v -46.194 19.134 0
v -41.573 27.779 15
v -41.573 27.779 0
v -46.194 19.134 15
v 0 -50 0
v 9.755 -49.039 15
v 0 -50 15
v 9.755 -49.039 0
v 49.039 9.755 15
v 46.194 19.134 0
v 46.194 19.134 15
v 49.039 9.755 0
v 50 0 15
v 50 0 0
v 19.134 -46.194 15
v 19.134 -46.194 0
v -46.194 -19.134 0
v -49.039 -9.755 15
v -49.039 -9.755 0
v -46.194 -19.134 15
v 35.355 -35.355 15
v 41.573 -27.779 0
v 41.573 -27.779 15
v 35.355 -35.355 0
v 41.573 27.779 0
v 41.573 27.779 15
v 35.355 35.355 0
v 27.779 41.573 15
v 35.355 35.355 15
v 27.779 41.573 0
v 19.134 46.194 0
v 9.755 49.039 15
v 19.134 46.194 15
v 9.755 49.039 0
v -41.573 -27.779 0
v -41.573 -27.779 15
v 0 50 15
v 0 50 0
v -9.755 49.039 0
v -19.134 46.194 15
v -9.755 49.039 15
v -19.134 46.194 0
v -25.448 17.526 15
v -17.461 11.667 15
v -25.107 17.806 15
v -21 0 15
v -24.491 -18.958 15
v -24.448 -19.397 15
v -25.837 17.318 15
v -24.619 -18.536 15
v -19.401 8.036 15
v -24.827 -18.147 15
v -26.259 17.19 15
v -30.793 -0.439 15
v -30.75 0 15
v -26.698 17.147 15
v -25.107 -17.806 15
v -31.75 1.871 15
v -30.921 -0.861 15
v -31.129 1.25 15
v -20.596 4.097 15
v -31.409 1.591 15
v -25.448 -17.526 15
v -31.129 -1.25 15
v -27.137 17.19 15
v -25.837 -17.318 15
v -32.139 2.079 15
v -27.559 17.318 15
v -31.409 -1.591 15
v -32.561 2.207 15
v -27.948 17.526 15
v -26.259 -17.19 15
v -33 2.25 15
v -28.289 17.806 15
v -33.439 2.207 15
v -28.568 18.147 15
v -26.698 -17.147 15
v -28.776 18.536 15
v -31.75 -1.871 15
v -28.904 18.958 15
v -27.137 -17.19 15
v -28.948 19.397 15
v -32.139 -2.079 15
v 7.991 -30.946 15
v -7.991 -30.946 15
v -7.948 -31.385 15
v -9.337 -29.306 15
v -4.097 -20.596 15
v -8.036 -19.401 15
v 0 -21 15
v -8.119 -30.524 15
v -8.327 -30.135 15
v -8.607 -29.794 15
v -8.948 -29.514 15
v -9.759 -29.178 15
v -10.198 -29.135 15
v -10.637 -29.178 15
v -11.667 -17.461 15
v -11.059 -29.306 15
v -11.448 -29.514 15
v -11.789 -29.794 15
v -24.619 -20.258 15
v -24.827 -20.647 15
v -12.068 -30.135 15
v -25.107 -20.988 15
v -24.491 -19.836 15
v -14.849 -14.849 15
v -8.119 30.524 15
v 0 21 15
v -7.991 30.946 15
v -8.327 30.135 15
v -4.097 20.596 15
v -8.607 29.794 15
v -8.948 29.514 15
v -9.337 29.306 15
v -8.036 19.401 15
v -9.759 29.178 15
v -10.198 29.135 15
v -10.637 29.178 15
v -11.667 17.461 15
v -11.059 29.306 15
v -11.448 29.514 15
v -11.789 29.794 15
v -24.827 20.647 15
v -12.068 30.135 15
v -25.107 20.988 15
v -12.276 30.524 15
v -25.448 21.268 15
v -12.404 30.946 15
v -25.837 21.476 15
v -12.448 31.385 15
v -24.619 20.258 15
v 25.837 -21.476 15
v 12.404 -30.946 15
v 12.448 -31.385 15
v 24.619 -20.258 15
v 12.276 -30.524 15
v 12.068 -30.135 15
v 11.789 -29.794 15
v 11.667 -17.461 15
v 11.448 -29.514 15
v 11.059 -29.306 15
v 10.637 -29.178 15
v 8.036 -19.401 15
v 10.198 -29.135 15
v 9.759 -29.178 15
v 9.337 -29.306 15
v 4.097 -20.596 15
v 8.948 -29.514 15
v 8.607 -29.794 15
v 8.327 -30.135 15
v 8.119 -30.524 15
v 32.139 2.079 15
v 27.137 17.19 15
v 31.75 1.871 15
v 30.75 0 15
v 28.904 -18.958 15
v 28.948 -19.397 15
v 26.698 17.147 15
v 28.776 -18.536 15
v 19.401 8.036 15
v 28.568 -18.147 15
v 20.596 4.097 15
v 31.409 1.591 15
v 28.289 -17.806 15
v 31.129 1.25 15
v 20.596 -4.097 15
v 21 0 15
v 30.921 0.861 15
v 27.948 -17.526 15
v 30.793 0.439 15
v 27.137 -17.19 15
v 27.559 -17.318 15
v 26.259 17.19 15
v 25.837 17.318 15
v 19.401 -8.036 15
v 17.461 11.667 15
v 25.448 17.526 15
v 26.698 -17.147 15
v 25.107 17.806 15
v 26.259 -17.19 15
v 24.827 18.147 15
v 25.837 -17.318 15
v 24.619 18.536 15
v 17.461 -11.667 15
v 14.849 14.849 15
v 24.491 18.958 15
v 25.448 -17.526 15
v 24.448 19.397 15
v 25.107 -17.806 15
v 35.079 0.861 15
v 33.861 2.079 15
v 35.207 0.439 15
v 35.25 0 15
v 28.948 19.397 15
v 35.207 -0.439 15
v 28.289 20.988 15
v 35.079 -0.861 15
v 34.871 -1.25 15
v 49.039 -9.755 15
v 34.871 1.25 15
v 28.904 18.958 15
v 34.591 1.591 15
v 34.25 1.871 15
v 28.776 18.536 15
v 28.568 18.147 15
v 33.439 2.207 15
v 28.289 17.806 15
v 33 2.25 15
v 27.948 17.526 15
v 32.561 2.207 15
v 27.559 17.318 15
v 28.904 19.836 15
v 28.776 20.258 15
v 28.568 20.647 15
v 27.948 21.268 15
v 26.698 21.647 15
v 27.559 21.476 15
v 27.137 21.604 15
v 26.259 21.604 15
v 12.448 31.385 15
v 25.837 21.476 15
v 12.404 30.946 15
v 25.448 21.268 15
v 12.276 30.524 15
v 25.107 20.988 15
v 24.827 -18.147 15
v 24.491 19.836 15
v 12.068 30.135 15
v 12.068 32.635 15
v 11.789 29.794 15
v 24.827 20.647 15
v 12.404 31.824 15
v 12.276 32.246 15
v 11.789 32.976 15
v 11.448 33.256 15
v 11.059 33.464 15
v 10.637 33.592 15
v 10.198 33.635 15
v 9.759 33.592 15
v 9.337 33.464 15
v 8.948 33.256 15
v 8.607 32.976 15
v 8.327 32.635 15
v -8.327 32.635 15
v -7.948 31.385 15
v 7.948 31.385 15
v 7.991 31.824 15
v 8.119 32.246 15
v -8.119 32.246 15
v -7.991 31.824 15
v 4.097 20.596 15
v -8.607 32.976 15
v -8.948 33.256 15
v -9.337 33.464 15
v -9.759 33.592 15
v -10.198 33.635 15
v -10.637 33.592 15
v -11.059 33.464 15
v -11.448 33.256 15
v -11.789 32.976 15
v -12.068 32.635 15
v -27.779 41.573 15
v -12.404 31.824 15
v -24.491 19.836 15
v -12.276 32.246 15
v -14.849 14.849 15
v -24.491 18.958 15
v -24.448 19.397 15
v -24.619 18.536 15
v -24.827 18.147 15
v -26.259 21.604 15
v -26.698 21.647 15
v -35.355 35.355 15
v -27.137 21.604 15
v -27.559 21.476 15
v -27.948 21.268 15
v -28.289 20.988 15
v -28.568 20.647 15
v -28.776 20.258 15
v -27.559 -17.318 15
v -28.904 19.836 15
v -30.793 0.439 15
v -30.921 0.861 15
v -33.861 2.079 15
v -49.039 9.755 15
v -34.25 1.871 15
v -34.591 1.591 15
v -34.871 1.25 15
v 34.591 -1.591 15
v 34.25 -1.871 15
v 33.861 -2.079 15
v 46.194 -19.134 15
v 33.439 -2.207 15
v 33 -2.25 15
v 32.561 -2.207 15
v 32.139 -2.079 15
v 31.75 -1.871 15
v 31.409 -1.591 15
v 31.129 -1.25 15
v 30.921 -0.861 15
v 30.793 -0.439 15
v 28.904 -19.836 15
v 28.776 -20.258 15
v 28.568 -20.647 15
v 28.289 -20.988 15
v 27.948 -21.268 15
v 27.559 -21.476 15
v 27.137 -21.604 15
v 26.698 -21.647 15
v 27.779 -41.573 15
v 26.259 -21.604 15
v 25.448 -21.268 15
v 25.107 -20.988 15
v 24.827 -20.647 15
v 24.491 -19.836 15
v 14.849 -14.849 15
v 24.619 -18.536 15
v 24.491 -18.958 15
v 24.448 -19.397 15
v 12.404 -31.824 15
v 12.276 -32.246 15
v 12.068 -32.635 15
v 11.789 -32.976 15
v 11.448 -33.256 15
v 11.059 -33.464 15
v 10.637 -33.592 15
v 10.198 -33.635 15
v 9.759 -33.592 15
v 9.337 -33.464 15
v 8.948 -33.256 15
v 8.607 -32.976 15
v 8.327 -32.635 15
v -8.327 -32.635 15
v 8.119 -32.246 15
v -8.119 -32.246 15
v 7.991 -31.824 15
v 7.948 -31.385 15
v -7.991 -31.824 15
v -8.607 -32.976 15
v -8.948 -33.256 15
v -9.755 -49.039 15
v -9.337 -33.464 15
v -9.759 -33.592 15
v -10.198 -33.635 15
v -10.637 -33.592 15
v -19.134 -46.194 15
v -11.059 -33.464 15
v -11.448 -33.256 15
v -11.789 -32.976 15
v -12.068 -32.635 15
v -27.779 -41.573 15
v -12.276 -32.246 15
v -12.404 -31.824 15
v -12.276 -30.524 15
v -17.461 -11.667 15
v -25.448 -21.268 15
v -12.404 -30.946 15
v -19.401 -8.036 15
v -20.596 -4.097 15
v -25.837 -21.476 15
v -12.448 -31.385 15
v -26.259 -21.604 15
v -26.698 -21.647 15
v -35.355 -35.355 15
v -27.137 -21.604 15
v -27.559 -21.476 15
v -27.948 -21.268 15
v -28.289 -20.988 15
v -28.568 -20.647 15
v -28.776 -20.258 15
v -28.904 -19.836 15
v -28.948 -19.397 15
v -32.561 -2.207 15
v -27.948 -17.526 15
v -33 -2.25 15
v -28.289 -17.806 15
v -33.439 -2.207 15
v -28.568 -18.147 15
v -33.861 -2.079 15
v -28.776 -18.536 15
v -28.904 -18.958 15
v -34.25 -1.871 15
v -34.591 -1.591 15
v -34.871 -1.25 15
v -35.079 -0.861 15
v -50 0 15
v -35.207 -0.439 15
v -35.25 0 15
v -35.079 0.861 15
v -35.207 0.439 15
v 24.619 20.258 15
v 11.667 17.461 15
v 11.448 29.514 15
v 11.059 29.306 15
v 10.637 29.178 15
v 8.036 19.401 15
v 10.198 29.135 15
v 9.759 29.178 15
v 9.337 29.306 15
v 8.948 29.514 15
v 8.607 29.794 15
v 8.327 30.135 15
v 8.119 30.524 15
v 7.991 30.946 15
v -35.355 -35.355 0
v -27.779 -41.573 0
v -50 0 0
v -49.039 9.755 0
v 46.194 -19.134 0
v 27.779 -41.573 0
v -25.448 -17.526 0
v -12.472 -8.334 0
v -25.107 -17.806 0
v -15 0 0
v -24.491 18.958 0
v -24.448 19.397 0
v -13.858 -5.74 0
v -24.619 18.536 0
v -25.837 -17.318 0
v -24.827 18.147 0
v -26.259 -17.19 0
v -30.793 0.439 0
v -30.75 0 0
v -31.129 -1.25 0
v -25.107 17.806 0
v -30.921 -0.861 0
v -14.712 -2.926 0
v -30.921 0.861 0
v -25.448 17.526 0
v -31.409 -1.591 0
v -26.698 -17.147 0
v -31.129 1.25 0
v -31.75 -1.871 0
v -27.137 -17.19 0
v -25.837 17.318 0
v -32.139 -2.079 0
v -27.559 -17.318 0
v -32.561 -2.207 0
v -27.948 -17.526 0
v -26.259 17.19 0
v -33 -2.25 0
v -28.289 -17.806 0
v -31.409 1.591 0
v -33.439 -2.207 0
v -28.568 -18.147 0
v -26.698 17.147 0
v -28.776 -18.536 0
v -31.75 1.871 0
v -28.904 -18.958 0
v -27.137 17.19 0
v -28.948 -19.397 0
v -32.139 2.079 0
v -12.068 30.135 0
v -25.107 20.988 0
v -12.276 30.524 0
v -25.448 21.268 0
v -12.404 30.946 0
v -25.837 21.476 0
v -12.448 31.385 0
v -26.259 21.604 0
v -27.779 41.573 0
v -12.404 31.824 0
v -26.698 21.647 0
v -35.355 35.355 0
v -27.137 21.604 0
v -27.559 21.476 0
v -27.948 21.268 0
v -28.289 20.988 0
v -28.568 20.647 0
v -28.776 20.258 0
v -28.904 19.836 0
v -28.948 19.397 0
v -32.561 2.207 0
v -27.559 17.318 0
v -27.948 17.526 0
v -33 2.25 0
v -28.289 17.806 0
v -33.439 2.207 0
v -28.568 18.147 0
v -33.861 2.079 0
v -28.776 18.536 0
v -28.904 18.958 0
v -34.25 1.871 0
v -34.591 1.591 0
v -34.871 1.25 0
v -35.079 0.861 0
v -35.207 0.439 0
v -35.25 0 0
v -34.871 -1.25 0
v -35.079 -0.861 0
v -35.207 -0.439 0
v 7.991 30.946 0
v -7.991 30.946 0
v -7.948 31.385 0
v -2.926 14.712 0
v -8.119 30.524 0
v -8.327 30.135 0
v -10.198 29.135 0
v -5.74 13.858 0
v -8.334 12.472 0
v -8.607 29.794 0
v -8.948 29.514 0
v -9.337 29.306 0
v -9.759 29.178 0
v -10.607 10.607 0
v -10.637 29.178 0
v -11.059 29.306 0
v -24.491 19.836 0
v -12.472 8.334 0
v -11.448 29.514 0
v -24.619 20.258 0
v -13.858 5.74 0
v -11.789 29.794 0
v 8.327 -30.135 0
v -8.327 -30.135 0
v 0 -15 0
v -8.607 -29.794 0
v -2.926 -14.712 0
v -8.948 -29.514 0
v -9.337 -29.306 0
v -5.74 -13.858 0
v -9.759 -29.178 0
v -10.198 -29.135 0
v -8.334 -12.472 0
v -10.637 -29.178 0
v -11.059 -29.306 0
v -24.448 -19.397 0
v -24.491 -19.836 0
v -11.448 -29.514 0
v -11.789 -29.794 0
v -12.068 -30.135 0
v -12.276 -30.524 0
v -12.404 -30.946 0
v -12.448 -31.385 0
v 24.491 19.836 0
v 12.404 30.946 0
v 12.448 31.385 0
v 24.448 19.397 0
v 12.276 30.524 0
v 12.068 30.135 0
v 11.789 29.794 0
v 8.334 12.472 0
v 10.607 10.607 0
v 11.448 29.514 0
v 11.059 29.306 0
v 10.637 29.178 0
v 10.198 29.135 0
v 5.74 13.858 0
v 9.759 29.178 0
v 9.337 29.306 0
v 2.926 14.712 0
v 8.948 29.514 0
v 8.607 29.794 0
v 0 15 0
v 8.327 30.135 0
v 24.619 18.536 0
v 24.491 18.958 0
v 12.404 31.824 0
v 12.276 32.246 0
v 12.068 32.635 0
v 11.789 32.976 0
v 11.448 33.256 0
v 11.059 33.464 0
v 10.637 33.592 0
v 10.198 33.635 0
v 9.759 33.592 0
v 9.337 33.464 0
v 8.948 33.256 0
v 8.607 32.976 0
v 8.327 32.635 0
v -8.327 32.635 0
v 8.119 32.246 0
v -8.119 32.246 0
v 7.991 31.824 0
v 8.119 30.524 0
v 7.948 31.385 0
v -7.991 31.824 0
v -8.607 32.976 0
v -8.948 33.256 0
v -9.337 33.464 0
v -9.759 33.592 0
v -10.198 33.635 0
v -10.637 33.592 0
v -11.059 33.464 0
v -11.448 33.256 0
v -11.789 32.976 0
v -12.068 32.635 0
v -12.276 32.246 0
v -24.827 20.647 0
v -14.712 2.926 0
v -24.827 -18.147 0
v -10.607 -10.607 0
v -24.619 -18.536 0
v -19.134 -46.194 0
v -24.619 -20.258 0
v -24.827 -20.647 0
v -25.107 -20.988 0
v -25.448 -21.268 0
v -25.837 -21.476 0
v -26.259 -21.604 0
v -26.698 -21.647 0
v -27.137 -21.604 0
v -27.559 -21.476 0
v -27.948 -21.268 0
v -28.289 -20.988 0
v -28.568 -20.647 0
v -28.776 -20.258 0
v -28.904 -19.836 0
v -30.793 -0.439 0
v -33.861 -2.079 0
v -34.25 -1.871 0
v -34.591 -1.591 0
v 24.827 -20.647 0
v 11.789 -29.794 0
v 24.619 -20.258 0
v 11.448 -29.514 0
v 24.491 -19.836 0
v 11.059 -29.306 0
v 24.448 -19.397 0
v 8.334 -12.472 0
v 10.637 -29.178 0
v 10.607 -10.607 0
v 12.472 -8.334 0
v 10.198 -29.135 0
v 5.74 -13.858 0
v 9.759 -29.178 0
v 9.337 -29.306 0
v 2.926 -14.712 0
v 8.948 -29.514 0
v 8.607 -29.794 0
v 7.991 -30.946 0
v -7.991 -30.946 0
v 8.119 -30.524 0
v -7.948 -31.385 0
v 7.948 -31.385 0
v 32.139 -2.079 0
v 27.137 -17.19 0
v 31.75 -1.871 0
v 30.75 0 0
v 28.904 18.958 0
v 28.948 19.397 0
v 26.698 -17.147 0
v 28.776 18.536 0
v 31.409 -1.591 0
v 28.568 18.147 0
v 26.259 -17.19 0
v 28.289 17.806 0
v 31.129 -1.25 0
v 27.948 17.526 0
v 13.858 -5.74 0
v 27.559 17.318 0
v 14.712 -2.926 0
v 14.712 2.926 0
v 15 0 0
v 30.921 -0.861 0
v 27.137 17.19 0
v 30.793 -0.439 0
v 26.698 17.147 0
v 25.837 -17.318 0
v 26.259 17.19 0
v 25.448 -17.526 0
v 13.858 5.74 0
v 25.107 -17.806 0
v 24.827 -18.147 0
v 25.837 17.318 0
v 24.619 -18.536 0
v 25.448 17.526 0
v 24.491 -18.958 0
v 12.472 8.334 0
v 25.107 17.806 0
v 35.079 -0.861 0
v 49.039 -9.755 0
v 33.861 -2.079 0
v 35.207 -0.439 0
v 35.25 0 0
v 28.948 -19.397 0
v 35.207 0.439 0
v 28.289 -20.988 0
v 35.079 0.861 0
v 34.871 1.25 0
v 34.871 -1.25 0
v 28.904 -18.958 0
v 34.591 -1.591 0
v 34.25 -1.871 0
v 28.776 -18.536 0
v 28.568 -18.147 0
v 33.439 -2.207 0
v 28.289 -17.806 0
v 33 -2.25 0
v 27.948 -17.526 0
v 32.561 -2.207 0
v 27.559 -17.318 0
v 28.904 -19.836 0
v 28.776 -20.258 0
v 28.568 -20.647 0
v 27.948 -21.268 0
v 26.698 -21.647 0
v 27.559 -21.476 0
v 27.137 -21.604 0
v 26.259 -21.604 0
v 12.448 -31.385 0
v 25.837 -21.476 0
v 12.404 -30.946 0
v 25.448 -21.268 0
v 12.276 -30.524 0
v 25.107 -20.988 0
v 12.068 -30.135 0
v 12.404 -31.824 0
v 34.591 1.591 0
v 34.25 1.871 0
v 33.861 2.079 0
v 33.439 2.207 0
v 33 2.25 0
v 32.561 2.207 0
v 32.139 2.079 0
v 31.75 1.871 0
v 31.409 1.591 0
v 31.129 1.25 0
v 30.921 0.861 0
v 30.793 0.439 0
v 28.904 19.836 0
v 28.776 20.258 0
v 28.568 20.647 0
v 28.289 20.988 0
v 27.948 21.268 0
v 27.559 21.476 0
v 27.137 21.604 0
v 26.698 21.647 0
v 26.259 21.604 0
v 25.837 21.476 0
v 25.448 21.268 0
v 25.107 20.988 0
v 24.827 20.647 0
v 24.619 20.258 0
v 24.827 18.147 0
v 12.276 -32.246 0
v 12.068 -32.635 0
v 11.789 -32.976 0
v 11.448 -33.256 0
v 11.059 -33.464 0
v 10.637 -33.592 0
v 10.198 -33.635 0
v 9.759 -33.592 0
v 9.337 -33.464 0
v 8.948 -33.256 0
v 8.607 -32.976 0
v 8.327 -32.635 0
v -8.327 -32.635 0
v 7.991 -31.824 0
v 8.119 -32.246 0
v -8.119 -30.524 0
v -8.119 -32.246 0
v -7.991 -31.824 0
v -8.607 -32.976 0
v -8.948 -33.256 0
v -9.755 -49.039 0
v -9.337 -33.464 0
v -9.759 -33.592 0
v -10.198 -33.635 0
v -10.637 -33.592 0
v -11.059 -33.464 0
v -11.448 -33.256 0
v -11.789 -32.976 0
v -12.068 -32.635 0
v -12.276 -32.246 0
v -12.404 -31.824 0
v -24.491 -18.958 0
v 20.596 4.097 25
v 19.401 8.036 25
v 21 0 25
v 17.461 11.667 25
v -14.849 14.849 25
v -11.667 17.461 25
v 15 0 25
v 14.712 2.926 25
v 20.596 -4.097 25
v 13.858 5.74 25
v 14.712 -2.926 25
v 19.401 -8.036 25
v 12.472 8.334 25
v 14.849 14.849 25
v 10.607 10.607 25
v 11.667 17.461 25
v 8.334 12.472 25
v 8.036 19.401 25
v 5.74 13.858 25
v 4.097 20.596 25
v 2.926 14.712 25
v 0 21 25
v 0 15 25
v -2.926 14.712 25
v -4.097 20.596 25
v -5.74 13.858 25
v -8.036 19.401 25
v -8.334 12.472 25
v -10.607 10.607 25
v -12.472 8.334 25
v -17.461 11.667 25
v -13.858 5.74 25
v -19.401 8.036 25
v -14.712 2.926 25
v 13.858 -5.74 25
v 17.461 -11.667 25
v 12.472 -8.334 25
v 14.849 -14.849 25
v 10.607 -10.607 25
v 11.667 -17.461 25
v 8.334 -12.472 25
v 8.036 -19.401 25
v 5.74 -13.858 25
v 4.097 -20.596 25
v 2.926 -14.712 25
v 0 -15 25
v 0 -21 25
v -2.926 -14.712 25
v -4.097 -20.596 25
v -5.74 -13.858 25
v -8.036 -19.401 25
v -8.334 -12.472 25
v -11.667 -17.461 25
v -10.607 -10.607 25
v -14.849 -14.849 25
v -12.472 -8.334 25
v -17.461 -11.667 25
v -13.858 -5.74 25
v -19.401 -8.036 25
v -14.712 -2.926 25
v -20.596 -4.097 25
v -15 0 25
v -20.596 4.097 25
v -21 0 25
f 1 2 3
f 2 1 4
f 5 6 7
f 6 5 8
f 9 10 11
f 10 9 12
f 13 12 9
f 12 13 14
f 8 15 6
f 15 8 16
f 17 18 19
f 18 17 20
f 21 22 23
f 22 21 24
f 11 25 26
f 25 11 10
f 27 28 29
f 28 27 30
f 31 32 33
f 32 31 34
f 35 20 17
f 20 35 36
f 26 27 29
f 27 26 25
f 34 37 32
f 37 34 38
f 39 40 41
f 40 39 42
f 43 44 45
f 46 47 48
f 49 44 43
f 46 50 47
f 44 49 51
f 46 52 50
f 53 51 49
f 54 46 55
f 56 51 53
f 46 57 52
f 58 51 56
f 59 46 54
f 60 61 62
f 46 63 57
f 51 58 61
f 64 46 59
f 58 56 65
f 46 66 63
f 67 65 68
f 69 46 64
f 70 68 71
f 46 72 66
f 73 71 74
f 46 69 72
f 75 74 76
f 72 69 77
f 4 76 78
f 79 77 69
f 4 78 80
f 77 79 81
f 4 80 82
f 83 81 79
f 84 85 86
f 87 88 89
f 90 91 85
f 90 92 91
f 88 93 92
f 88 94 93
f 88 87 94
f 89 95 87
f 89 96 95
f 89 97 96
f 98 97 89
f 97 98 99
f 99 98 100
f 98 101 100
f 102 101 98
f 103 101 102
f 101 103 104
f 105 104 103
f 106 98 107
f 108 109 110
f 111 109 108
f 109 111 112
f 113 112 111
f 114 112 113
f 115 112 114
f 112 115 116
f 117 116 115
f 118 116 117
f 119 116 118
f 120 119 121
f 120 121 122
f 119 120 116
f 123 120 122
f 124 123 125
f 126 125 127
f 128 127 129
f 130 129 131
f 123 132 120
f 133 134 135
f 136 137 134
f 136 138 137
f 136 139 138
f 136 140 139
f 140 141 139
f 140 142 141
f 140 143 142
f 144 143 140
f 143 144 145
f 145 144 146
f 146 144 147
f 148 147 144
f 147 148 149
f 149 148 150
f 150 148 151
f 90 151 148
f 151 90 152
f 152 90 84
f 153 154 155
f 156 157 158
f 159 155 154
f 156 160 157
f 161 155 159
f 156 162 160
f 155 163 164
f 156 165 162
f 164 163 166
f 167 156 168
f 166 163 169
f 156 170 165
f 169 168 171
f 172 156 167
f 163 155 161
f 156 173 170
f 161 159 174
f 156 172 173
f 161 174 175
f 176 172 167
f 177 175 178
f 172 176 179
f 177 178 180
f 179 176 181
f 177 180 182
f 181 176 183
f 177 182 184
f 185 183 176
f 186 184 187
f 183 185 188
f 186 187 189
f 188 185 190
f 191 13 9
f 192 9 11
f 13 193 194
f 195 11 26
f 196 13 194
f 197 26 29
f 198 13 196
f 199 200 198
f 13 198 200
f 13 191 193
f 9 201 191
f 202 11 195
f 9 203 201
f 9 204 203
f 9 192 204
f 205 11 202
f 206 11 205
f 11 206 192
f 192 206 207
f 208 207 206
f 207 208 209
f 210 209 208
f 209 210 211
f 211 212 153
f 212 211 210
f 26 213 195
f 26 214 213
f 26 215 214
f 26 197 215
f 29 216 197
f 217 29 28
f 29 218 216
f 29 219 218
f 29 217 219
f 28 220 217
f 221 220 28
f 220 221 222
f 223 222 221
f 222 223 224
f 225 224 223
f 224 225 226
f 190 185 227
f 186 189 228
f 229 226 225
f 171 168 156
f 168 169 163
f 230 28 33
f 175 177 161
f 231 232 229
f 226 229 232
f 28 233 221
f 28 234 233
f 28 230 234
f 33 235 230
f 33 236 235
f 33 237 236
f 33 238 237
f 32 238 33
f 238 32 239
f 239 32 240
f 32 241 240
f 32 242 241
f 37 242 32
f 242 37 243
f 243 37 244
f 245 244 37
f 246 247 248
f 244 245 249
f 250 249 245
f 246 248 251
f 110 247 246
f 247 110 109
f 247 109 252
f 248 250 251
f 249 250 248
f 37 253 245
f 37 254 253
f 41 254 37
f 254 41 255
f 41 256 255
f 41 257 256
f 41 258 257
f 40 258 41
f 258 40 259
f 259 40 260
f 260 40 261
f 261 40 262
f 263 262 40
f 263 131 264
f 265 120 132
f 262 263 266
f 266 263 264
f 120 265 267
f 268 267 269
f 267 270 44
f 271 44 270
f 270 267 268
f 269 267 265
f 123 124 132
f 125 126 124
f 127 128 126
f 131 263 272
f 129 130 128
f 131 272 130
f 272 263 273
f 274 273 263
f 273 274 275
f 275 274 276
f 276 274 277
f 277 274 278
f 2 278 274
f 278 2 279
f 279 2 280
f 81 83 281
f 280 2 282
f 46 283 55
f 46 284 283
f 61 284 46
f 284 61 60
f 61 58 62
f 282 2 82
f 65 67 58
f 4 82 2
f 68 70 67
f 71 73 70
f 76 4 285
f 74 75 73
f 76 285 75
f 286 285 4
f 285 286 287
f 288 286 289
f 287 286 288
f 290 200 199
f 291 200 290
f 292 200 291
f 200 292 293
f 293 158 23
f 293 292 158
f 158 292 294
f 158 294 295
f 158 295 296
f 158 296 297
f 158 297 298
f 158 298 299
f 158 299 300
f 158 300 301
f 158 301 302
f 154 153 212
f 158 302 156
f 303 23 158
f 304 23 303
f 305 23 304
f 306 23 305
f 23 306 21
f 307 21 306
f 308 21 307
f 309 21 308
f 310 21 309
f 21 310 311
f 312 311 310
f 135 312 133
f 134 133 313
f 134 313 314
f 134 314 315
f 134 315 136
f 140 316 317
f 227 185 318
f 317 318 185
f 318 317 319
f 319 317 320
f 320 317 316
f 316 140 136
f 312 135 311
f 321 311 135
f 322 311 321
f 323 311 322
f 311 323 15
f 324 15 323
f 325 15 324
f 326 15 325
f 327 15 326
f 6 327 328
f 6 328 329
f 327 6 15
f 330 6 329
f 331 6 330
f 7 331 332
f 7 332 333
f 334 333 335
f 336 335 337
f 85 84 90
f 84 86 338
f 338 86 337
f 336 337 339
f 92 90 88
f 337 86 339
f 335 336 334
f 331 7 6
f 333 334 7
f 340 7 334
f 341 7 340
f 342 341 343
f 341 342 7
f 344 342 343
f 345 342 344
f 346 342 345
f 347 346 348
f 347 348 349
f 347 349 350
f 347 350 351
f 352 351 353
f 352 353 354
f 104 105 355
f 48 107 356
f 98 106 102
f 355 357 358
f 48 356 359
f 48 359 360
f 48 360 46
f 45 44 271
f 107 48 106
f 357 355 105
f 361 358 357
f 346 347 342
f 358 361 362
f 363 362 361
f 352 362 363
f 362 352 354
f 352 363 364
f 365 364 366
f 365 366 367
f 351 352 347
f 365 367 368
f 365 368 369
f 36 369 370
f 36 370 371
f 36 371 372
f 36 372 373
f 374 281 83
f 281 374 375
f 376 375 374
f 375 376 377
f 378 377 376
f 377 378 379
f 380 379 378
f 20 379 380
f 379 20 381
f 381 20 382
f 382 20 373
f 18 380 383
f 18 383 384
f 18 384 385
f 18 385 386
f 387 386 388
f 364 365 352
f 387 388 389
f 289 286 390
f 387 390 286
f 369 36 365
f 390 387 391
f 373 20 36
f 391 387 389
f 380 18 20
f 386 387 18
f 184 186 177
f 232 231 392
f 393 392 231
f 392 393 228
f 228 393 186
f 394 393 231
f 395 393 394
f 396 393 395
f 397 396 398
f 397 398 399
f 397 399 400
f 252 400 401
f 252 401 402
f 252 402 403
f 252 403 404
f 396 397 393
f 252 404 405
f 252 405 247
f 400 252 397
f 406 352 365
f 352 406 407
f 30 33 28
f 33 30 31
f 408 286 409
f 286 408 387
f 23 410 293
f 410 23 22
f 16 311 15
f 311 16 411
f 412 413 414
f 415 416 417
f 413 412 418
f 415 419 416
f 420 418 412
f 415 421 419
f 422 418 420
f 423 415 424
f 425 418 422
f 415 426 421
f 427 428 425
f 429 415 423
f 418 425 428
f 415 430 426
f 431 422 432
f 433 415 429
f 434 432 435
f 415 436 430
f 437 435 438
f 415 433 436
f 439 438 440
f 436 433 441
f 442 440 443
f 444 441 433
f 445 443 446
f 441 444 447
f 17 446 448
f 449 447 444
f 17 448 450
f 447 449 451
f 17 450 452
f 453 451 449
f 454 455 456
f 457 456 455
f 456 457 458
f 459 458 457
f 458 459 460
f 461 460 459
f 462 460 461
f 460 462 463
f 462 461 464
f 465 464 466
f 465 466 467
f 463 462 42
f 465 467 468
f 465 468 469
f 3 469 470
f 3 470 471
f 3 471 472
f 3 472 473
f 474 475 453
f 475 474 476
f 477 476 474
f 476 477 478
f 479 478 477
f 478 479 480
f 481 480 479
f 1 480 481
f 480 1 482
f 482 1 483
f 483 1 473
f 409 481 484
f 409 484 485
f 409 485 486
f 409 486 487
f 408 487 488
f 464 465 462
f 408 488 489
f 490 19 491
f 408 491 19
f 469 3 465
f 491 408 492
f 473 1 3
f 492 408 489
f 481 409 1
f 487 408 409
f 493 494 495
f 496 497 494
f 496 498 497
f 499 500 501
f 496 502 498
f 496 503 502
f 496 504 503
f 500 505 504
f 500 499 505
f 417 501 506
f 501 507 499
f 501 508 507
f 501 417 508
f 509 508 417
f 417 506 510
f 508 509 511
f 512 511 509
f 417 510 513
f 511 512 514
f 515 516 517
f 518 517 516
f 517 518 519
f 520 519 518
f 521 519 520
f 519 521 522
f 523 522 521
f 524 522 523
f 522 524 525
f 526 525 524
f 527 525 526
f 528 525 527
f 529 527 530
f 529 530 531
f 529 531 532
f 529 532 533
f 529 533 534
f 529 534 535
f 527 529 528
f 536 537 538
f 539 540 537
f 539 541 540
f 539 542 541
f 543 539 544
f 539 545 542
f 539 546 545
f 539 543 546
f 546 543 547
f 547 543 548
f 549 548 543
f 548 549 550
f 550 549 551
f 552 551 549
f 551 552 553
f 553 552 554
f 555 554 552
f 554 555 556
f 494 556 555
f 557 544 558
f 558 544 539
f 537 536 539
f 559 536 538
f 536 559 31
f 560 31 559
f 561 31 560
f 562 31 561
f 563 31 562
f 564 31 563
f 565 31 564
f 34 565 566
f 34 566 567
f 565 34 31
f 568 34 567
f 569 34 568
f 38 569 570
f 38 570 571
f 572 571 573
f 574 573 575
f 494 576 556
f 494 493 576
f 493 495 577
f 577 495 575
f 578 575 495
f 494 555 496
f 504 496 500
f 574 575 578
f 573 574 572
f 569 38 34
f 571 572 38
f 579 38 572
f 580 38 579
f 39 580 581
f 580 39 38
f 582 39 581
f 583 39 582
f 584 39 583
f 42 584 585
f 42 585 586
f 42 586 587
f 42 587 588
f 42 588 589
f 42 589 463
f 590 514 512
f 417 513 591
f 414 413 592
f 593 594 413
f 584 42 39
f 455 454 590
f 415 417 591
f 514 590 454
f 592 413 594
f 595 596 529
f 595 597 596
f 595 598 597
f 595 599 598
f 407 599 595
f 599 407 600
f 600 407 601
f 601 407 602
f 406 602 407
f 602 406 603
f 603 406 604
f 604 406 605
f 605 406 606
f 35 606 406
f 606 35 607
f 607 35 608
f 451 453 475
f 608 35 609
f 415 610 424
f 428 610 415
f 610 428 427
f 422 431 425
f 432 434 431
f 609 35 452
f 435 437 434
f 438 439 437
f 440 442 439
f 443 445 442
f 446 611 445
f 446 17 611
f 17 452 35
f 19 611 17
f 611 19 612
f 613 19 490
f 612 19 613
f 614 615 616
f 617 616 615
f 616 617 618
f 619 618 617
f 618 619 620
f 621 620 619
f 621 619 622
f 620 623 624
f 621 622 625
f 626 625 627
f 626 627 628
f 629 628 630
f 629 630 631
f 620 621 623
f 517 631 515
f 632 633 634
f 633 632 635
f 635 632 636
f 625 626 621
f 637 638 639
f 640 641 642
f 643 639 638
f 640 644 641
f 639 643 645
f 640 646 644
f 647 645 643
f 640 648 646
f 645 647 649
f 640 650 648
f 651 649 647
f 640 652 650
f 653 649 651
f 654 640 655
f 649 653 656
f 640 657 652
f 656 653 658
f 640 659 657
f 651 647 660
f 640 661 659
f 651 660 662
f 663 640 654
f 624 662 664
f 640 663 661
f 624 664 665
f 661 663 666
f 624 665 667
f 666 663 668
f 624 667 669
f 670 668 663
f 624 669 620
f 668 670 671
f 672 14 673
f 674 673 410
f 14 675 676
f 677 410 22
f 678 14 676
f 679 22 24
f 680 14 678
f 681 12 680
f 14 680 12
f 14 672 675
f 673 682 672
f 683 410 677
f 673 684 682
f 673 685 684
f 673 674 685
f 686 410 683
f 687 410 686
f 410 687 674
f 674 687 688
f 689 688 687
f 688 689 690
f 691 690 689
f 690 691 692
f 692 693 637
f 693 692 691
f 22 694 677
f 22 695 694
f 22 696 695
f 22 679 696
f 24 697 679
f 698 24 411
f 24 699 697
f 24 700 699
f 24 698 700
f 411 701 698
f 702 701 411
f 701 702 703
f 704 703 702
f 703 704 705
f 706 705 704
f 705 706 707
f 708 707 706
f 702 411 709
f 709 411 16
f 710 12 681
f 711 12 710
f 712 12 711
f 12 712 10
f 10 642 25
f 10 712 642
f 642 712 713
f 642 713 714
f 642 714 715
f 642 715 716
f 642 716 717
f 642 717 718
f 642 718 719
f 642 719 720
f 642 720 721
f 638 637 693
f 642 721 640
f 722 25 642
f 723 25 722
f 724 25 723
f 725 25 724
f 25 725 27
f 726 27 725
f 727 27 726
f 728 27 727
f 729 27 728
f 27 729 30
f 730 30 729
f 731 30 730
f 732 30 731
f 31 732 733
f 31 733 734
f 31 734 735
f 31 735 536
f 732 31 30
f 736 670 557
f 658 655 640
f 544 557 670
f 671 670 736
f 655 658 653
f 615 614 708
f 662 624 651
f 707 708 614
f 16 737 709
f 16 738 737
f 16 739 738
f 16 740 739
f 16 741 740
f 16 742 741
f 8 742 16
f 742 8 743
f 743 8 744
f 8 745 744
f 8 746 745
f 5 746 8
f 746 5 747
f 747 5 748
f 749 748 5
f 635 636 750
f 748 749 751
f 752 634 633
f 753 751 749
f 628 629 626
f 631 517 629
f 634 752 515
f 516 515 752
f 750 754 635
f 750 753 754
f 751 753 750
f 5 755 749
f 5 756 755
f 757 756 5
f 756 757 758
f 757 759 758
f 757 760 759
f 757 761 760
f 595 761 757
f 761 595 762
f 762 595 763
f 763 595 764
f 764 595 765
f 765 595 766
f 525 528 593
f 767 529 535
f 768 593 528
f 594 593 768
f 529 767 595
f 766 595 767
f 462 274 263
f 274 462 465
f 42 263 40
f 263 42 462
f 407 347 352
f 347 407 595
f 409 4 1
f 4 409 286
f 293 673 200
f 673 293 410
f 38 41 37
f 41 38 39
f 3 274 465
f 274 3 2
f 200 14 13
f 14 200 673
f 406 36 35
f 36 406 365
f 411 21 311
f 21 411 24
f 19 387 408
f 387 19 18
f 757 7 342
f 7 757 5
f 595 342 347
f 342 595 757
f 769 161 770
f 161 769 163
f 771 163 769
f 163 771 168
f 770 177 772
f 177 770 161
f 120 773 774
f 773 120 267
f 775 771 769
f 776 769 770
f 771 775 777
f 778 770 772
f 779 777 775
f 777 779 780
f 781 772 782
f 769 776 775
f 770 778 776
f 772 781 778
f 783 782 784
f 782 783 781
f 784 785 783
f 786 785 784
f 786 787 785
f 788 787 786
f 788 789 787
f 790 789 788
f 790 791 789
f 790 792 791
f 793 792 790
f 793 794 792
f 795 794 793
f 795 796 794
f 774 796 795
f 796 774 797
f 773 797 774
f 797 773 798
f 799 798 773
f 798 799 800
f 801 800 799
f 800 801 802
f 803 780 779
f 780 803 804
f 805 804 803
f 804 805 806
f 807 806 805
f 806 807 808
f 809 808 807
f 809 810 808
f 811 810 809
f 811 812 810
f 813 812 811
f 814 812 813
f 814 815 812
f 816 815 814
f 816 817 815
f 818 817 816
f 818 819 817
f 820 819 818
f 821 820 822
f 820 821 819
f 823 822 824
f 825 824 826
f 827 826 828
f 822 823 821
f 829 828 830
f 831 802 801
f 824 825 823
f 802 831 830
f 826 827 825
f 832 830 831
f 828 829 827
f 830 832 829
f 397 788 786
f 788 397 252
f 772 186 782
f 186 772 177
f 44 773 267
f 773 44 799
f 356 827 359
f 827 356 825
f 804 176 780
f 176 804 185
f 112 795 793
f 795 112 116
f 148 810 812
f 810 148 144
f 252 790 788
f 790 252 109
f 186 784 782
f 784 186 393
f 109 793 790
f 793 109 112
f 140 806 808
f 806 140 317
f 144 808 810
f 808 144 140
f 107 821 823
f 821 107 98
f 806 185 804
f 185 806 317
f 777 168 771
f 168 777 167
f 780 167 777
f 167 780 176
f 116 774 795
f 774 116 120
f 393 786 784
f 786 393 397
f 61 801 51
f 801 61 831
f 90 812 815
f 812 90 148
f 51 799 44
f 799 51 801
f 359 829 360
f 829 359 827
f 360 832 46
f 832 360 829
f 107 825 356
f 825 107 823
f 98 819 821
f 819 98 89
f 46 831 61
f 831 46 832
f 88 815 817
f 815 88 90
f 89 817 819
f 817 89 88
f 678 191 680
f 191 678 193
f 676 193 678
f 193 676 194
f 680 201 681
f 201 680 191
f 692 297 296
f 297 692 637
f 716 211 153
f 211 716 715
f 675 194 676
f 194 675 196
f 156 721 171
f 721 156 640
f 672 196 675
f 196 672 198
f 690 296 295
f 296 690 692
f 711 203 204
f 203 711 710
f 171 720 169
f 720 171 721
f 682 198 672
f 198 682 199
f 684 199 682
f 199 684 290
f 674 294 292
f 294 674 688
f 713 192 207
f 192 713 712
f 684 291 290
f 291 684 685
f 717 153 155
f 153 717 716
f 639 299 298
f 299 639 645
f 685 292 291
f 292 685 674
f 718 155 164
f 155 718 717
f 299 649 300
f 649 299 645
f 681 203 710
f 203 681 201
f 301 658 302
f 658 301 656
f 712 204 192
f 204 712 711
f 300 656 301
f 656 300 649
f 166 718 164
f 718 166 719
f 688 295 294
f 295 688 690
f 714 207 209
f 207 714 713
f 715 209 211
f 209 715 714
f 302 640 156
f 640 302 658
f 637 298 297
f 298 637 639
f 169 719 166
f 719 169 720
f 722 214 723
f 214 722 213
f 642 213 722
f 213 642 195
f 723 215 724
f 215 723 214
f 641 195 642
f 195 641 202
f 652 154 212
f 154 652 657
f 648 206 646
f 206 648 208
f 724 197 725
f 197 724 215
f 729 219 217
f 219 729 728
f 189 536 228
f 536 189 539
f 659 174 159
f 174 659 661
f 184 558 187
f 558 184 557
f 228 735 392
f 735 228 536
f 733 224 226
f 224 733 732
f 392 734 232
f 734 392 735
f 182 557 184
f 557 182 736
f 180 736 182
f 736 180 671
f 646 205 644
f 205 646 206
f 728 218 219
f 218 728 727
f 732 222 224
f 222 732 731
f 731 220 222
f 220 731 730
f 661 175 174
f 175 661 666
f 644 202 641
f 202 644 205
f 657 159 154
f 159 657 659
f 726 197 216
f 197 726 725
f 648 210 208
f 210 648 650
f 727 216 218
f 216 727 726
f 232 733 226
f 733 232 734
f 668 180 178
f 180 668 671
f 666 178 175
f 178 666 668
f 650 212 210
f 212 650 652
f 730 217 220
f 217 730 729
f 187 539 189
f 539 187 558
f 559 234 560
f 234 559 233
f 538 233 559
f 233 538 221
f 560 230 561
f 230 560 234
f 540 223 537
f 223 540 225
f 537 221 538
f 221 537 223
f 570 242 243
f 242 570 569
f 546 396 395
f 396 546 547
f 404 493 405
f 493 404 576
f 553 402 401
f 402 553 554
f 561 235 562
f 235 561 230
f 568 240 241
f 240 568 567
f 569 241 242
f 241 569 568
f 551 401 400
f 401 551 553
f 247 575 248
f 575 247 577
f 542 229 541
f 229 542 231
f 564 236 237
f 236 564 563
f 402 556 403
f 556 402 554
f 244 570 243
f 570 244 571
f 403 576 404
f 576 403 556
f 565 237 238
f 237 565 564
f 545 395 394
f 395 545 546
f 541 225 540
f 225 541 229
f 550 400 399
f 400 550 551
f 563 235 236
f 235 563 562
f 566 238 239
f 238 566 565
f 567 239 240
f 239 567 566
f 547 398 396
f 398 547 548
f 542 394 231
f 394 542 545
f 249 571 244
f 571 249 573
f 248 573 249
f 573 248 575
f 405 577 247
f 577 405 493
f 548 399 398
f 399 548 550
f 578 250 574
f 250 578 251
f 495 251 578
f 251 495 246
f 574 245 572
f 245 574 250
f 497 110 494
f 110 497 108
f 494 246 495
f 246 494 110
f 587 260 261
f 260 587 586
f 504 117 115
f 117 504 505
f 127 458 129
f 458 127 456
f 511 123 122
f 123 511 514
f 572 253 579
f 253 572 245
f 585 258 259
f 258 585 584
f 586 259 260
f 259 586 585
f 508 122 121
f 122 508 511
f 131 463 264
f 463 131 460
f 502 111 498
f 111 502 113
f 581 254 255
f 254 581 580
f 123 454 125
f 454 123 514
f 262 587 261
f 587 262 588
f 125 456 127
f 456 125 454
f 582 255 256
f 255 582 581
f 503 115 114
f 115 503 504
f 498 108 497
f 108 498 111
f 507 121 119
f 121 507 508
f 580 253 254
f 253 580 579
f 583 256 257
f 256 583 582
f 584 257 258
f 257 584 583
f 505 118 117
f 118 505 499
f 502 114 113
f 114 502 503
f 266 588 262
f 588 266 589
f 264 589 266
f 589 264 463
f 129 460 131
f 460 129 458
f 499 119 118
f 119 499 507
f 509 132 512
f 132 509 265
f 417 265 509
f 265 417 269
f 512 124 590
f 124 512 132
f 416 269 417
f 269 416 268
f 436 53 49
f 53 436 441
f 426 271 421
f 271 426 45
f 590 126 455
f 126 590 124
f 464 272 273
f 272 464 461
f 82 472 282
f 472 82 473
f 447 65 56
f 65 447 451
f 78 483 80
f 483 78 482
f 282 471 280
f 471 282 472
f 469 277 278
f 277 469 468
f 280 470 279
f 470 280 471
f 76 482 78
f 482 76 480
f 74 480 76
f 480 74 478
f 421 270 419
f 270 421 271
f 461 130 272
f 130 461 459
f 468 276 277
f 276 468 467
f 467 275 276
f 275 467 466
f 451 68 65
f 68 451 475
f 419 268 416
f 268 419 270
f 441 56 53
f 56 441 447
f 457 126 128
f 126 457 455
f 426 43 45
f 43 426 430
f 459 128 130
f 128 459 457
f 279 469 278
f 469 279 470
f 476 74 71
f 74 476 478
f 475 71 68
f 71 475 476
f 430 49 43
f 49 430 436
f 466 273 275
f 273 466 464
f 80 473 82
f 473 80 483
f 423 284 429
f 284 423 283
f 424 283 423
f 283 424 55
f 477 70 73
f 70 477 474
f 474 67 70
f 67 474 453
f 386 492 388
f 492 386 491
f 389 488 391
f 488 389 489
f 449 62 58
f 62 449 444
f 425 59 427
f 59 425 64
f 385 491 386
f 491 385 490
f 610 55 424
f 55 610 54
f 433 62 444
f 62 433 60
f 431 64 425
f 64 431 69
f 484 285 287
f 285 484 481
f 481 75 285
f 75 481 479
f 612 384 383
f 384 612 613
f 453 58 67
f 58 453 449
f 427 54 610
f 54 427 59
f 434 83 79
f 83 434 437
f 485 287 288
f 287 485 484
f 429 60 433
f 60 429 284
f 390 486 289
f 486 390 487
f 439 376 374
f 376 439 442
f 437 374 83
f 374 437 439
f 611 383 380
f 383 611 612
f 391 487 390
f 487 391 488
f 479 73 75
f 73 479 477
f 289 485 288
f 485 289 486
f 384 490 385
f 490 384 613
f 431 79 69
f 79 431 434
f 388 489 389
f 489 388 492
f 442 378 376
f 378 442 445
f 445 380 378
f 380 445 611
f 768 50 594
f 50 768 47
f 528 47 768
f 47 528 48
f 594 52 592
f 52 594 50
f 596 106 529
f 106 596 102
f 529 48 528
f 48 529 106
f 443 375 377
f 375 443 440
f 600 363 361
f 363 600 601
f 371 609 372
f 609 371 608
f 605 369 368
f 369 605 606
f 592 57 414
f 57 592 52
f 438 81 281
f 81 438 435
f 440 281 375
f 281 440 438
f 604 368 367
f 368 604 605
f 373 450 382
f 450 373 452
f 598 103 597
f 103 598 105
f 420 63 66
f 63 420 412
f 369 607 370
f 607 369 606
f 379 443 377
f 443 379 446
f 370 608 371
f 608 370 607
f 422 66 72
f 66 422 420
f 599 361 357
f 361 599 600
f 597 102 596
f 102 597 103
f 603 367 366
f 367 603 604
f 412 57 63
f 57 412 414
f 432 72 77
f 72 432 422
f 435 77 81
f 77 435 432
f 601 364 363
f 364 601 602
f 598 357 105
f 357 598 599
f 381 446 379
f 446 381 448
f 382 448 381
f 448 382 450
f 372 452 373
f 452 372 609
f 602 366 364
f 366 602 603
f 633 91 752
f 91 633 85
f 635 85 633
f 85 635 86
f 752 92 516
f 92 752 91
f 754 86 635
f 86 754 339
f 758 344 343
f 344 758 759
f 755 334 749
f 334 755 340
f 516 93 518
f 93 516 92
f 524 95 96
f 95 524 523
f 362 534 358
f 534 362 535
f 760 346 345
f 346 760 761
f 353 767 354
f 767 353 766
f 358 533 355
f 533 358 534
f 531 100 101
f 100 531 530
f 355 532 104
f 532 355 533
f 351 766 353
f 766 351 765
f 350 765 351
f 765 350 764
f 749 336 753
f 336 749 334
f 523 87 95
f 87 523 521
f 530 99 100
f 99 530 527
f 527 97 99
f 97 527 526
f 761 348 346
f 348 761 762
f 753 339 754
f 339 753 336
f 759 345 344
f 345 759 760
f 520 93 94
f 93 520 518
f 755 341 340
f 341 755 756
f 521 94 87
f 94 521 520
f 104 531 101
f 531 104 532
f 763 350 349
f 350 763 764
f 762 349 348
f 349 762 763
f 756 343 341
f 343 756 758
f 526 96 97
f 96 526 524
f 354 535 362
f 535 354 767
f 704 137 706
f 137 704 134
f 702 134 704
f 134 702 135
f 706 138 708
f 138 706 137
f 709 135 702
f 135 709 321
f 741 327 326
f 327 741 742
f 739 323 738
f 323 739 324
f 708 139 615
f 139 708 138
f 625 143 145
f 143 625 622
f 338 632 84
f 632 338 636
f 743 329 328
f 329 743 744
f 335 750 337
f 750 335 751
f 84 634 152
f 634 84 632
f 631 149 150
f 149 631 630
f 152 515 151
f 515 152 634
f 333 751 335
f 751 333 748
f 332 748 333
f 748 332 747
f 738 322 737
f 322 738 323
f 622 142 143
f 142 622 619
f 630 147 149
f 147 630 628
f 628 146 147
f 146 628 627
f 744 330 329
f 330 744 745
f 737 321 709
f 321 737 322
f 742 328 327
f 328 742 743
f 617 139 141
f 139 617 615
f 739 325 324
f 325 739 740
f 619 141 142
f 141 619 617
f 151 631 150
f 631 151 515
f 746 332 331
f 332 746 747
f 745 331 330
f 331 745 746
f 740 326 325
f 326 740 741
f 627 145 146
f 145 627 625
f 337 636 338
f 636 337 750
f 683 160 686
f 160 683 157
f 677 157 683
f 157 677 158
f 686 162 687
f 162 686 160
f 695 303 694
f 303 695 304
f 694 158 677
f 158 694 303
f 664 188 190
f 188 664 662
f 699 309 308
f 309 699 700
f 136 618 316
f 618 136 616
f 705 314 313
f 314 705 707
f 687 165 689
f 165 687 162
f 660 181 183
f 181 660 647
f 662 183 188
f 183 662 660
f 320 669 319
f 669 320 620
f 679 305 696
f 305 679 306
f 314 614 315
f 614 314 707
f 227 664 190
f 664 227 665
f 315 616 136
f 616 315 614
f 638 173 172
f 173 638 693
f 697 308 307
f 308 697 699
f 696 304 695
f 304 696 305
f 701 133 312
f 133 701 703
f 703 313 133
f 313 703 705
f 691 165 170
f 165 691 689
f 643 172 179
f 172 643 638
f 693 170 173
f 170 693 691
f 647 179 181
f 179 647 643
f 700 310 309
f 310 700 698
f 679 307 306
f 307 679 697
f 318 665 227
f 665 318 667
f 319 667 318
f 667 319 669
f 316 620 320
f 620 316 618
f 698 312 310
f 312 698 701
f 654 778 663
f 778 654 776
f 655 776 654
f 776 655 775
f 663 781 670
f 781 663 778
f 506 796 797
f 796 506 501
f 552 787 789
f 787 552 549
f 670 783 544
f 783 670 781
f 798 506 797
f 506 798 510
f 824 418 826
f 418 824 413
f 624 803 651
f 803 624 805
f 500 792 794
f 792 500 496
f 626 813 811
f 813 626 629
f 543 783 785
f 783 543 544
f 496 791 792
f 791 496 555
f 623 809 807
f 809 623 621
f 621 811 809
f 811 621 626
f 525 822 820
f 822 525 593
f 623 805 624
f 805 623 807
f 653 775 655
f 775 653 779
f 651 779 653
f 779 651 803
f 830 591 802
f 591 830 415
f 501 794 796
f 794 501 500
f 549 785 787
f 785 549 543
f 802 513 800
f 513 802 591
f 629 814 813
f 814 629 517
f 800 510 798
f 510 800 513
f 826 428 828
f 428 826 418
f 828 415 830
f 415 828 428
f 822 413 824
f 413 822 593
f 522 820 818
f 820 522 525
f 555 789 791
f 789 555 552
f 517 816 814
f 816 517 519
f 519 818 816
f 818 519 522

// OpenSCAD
$fn = 32;

// ----------------------------------------------------------------------
// Flange Ø100 x 15
// 10 holes on a Ø66 bolt circle, bolted joints
// ----------------------------------------------------------------------

// --- parameters (mm) ---
flange_d = 100;  // outside diameter of the flange
thickness = 15;  // flange thickness
holes = 10;      // number of bolt holes
pcd = 66;        // bolt circle diameter
start_deg = 0;   // angle of the first hole, from +X
hole_d = 4.5;    // bolt hole diameter
bore_d = 30;     // central through bore
hub_d = 42;      // hub outside diameter
hub_h = 10;      // hub height above the flange face (0 = no hub)

// --- derived feature positions (mm) ---
height = thickness + hub_h;  // = 25   overall height of the part
pcd_r = pcd / 2;             // = 33   bolt circle radius
hole_step = 360 / holes;     // = 36   angular pitch
feature_centers = [
  [pcd_r * cos(start_deg + 0 * hole_step), pcd_r * sin(start_deg + 0 * hole_step)],
  [pcd_r * cos(start_deg + 1 * hole_step), pcd_r * sin(start_deg + 1 * hole_step)],
  [pcd_r * cos(start_deg + 2 * hole_step), pcd_r * sin(start_deg + 2 * hole_step)],
  [pcd_r * cos(start_deg + 3 * hole_step), pcd_r * sin(start_deg + 3 * hole_step)],
  [pcd_r * cos(start_deg + 4 * hole_step), pcd_r * sin(start_deg + 4 * hole_step)],
  [pcd_r * cos(start_deg + 5 * hole_step), pcd_r * sin(start_deg + 5 * hole_step)],
  [pcd_r * cos(start_deg + 6 * hole_step), pcd_r * sin(start_deg + 6 * hole_step)],
  [pcd_r * cos(start_deg + 7 * hole_step), pcd_r * sin(start_deg + 7 * hole_step)],
  [pcd_r * cos(start_deg + 8 * hole_step), pcd_r * sin(start_deg + 8 * hole_step)],
  [pcd_r * cos(start_deg + 9 * hole_step), pcd_r * sin(start_deg + 9 * hole_step)]
];   // bolt hole centres on the pitch circle

// flange disc, every hole and the bore cut straight through
difference() {
  union() {
    cylinder(d = flange_d, h = thickness);
    cylinder(d = hub_d, h = height);  // hub, overlapped into the flange
  }
  translate([0, 0, -1]) cylinder(d = bore_d, h = height + 2);  // bore, through
  for (centre = feature_centers)
    translate([centre[0], centre[1], -1]) cylinder(d = hole_d, h = thickness + 2);
}
